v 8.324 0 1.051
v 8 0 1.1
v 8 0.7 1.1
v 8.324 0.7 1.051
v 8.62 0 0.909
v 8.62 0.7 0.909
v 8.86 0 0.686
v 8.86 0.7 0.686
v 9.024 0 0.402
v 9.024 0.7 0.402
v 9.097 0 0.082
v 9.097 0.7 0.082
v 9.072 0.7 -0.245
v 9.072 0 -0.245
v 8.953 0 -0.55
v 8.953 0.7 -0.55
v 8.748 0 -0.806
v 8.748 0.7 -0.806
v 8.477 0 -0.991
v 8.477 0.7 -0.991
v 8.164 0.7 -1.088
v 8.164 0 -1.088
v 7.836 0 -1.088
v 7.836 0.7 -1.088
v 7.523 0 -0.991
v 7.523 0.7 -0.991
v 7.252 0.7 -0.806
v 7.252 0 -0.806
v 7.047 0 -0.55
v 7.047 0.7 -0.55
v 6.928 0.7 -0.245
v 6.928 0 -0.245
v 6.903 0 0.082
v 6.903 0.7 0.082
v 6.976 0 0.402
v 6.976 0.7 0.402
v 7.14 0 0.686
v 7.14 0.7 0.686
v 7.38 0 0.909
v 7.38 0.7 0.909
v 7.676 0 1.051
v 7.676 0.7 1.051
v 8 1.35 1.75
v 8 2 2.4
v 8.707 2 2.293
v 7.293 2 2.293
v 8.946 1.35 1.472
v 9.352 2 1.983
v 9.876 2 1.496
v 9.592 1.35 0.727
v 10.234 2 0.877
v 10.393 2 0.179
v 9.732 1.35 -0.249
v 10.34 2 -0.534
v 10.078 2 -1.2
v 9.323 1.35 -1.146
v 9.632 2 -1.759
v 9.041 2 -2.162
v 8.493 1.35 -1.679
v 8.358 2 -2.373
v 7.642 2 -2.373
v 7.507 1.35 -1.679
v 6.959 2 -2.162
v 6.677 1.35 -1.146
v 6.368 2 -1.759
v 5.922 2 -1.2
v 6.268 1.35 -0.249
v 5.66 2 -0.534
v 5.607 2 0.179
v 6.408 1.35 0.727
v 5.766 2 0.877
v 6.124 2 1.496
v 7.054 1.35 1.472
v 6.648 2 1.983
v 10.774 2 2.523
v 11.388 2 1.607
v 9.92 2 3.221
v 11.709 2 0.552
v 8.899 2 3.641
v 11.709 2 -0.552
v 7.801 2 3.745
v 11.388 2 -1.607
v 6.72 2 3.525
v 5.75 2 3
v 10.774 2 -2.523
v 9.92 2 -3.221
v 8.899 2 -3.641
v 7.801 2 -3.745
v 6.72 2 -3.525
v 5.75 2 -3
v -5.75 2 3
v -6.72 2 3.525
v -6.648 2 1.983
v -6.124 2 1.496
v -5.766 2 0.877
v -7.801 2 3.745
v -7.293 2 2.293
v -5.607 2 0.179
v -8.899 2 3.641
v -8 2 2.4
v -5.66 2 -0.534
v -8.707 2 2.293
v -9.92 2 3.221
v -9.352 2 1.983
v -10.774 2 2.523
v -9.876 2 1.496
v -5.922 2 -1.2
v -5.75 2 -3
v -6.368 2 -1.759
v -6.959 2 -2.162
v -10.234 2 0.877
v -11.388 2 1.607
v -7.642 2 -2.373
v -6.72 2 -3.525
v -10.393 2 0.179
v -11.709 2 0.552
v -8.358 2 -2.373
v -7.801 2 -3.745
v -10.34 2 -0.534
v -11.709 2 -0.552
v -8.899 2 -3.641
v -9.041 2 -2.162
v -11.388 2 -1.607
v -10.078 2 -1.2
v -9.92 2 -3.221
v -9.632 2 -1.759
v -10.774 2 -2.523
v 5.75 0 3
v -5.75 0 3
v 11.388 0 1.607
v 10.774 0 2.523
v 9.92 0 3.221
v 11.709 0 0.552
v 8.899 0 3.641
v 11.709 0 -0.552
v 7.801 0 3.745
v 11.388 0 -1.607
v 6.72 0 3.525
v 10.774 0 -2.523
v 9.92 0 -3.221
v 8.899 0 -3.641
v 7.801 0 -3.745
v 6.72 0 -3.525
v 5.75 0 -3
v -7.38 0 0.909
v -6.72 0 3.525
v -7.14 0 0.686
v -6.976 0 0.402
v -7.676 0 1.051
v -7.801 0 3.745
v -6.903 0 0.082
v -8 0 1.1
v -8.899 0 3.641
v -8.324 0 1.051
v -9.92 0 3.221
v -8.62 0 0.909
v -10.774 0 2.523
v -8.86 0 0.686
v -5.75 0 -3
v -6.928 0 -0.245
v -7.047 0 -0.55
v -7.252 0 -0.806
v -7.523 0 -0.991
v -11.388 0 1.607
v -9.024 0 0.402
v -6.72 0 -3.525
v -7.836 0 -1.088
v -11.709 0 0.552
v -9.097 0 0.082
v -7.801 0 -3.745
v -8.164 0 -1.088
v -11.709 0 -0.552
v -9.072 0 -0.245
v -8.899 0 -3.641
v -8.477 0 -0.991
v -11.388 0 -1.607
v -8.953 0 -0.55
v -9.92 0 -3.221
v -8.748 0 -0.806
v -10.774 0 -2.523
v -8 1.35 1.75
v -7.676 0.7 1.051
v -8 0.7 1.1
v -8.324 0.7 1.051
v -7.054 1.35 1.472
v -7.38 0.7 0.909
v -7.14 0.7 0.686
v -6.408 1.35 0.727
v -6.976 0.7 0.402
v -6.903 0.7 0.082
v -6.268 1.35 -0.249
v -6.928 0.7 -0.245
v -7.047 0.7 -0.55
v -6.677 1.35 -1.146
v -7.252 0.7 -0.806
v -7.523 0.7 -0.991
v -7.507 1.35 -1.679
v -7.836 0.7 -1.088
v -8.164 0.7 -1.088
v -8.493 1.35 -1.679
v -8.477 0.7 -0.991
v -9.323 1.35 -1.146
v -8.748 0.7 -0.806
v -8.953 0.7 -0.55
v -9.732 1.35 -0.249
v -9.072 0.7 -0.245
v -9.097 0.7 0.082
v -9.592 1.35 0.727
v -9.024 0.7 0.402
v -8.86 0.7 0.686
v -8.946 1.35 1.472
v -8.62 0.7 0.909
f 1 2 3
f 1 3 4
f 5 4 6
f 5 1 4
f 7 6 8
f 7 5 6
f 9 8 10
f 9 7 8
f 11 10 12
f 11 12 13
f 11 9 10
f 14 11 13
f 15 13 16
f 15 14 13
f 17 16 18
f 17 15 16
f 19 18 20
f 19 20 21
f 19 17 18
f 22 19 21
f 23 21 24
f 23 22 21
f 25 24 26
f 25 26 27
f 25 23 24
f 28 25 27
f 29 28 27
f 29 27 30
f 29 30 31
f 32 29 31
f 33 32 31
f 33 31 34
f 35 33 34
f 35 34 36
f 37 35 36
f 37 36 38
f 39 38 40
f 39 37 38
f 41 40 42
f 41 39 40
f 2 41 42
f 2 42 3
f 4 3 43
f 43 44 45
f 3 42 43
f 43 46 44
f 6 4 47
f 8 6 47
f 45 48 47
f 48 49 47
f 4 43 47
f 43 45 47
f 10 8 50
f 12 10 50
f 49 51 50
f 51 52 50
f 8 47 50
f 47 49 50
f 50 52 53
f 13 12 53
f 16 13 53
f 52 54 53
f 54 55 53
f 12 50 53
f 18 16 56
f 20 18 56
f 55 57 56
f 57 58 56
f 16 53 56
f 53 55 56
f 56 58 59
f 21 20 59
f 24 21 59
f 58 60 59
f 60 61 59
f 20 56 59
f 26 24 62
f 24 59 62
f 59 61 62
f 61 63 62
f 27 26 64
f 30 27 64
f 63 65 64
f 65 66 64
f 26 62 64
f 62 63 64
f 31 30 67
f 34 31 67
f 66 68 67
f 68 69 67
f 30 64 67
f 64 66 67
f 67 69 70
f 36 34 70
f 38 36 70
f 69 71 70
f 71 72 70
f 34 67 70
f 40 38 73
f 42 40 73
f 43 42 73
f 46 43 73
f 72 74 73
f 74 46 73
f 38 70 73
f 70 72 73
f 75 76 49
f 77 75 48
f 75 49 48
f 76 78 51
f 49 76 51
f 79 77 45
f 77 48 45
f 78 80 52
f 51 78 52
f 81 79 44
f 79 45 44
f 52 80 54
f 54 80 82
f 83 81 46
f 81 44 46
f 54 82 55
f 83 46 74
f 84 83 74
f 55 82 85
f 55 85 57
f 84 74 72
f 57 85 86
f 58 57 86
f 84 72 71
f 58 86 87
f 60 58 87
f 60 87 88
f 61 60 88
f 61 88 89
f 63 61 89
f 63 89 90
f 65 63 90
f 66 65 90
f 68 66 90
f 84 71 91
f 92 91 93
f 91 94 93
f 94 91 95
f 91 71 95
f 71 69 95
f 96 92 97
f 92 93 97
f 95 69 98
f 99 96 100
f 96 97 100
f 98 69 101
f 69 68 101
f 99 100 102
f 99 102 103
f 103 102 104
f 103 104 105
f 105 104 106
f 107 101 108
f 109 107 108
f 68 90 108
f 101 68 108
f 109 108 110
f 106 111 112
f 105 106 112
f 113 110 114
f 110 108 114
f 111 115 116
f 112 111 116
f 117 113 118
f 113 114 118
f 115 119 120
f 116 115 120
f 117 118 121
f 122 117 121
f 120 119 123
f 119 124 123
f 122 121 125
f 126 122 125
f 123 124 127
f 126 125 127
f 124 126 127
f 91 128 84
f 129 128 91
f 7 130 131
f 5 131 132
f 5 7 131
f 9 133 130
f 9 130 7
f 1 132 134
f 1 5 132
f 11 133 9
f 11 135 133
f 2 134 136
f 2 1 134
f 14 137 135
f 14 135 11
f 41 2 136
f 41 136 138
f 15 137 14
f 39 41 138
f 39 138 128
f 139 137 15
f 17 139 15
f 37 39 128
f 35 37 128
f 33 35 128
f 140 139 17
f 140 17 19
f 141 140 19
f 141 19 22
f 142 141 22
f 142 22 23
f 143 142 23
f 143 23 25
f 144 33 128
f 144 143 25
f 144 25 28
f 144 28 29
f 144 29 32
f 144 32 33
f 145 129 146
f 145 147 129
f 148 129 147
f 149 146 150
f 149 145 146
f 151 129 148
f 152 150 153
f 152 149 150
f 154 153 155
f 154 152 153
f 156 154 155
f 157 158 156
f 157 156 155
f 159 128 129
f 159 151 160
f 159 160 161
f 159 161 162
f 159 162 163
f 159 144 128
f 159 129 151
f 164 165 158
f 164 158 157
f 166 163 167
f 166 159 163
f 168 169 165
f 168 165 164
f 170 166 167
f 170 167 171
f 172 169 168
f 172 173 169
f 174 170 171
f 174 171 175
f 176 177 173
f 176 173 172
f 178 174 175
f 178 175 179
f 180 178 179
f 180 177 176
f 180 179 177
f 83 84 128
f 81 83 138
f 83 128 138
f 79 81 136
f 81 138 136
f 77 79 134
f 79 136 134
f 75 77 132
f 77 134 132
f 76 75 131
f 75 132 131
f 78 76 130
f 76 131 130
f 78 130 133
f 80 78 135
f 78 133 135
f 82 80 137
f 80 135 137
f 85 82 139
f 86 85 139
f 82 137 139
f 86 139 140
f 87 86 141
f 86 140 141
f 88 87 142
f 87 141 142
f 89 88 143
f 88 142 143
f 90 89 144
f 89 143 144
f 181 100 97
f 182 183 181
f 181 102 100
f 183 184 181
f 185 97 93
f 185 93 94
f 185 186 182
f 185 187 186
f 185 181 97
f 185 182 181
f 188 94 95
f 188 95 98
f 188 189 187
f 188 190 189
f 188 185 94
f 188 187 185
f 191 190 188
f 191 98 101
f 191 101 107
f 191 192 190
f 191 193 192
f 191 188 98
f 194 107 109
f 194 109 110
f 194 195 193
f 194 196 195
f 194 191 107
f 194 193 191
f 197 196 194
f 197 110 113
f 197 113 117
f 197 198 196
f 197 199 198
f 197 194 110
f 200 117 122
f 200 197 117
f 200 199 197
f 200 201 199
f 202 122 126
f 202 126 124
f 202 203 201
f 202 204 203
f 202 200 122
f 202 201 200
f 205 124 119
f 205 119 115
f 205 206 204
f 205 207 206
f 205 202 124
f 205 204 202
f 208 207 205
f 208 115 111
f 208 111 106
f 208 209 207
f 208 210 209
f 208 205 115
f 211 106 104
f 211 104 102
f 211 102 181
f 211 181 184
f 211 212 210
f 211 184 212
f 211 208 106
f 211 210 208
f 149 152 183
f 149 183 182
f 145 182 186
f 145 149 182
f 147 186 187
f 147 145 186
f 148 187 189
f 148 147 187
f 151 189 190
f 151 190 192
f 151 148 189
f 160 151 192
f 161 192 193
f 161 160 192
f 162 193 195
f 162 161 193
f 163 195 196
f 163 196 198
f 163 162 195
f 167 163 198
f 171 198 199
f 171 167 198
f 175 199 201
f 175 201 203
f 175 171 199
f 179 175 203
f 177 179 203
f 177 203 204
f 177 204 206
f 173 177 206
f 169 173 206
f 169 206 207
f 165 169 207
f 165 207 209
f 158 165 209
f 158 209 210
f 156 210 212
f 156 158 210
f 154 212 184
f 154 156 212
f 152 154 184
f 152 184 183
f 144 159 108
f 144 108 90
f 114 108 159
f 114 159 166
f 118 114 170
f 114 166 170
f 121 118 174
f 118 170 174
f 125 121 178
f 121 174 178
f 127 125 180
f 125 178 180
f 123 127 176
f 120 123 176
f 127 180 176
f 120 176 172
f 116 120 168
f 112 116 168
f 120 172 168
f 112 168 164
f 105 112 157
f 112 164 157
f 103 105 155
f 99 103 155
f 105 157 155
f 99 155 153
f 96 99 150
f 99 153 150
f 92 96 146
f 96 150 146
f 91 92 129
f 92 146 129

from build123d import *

# Parameters (mm, degrees)
SKETCH1_R           = 1.1
BOSS_EXTRUDE1_DEPTH = 2
BOSS_EXTRUDE3_START = -2
SKETCH3_R           = 3.75
SKETCH3_R_2         = 1.1
BOSS_EXTRUDE3_DEPTH = 2
CHAMFER1_SIZE       = 1.3


with BuildPart() as part:
    # Sketch1 → Boss-Extrude1 (new body)
    with BuildSketch(Plane(origin=(0, 0, 0), x_dir=(1, 0, 0), z_dir=(0, 1, 0))):
        with BuildLine():
            Line((-8, 3), (8, 3))
            ThreePointArc((8, 3), (11, 0), (8, -3))
            Line((8, -3), (-8, -3))
            ThreePointArc((-8, -3), (-11, 0), (-8, 3))
        make_face()
        with Locations(Location((-8, 0, 0), (0, 0, 270))):
            Circle(SKETCH1_R, mode=Mode.SUBTRACT)
        with Locations(Location((8, 0, 0), (0, 0, 270))):
            Circle(SKETCH1_R, mode=Mode.SUBTRACT)
    extrude(amount=BOSS_EXTRUDE1_DEPTH)

    # Sketch3 → Boss-Extrude3 (add)
    # profile 1 of 2: a face of its own
    with BuildSketch(Plane(origin=(0, 2, 0), x_dir=(1, 0, 0), z_dir=(0, 1, 0)).offset(BOSS_EXTRUDE3_START)):
        with Locations((-8, 0)):
            Circle(SKETCH3_R)
        with Locations(Location((-8, 0, 0), (0, 0, 270))):
            Circle(SKETCH3_R_2, mode=Mode.SUBTRACT)
    # profile 2 of 2: a face of its own
    with BuildSketch(Plane(origin=(0, 2, 0), x_dir=(1, 0, 0), z_dir=(0, 1, 0)).offset(BOSS_EXTRUDE3_START)):
        with Locations((8, 0)):
            Circle(SKETCH3_R)
        with Locations(Location((8, 0, 0), (0, 0, 270))):
            Circle(SKETCH3_R_2, mode=Mode.SUBTRACT)
    extrude(amount=BOSS_EXTRUDE3_DEPTH)

    # Chamfer1
    chamfer1_edges = [part.edges().sort_by_distance(p)[0] for p in [
        (-8, 2, -1.1),
        (8, 2, -1.1),
    ]]
    chamfer(chamfer1_edges, length=CHAMFER1_SIZE)


solid = part.part
